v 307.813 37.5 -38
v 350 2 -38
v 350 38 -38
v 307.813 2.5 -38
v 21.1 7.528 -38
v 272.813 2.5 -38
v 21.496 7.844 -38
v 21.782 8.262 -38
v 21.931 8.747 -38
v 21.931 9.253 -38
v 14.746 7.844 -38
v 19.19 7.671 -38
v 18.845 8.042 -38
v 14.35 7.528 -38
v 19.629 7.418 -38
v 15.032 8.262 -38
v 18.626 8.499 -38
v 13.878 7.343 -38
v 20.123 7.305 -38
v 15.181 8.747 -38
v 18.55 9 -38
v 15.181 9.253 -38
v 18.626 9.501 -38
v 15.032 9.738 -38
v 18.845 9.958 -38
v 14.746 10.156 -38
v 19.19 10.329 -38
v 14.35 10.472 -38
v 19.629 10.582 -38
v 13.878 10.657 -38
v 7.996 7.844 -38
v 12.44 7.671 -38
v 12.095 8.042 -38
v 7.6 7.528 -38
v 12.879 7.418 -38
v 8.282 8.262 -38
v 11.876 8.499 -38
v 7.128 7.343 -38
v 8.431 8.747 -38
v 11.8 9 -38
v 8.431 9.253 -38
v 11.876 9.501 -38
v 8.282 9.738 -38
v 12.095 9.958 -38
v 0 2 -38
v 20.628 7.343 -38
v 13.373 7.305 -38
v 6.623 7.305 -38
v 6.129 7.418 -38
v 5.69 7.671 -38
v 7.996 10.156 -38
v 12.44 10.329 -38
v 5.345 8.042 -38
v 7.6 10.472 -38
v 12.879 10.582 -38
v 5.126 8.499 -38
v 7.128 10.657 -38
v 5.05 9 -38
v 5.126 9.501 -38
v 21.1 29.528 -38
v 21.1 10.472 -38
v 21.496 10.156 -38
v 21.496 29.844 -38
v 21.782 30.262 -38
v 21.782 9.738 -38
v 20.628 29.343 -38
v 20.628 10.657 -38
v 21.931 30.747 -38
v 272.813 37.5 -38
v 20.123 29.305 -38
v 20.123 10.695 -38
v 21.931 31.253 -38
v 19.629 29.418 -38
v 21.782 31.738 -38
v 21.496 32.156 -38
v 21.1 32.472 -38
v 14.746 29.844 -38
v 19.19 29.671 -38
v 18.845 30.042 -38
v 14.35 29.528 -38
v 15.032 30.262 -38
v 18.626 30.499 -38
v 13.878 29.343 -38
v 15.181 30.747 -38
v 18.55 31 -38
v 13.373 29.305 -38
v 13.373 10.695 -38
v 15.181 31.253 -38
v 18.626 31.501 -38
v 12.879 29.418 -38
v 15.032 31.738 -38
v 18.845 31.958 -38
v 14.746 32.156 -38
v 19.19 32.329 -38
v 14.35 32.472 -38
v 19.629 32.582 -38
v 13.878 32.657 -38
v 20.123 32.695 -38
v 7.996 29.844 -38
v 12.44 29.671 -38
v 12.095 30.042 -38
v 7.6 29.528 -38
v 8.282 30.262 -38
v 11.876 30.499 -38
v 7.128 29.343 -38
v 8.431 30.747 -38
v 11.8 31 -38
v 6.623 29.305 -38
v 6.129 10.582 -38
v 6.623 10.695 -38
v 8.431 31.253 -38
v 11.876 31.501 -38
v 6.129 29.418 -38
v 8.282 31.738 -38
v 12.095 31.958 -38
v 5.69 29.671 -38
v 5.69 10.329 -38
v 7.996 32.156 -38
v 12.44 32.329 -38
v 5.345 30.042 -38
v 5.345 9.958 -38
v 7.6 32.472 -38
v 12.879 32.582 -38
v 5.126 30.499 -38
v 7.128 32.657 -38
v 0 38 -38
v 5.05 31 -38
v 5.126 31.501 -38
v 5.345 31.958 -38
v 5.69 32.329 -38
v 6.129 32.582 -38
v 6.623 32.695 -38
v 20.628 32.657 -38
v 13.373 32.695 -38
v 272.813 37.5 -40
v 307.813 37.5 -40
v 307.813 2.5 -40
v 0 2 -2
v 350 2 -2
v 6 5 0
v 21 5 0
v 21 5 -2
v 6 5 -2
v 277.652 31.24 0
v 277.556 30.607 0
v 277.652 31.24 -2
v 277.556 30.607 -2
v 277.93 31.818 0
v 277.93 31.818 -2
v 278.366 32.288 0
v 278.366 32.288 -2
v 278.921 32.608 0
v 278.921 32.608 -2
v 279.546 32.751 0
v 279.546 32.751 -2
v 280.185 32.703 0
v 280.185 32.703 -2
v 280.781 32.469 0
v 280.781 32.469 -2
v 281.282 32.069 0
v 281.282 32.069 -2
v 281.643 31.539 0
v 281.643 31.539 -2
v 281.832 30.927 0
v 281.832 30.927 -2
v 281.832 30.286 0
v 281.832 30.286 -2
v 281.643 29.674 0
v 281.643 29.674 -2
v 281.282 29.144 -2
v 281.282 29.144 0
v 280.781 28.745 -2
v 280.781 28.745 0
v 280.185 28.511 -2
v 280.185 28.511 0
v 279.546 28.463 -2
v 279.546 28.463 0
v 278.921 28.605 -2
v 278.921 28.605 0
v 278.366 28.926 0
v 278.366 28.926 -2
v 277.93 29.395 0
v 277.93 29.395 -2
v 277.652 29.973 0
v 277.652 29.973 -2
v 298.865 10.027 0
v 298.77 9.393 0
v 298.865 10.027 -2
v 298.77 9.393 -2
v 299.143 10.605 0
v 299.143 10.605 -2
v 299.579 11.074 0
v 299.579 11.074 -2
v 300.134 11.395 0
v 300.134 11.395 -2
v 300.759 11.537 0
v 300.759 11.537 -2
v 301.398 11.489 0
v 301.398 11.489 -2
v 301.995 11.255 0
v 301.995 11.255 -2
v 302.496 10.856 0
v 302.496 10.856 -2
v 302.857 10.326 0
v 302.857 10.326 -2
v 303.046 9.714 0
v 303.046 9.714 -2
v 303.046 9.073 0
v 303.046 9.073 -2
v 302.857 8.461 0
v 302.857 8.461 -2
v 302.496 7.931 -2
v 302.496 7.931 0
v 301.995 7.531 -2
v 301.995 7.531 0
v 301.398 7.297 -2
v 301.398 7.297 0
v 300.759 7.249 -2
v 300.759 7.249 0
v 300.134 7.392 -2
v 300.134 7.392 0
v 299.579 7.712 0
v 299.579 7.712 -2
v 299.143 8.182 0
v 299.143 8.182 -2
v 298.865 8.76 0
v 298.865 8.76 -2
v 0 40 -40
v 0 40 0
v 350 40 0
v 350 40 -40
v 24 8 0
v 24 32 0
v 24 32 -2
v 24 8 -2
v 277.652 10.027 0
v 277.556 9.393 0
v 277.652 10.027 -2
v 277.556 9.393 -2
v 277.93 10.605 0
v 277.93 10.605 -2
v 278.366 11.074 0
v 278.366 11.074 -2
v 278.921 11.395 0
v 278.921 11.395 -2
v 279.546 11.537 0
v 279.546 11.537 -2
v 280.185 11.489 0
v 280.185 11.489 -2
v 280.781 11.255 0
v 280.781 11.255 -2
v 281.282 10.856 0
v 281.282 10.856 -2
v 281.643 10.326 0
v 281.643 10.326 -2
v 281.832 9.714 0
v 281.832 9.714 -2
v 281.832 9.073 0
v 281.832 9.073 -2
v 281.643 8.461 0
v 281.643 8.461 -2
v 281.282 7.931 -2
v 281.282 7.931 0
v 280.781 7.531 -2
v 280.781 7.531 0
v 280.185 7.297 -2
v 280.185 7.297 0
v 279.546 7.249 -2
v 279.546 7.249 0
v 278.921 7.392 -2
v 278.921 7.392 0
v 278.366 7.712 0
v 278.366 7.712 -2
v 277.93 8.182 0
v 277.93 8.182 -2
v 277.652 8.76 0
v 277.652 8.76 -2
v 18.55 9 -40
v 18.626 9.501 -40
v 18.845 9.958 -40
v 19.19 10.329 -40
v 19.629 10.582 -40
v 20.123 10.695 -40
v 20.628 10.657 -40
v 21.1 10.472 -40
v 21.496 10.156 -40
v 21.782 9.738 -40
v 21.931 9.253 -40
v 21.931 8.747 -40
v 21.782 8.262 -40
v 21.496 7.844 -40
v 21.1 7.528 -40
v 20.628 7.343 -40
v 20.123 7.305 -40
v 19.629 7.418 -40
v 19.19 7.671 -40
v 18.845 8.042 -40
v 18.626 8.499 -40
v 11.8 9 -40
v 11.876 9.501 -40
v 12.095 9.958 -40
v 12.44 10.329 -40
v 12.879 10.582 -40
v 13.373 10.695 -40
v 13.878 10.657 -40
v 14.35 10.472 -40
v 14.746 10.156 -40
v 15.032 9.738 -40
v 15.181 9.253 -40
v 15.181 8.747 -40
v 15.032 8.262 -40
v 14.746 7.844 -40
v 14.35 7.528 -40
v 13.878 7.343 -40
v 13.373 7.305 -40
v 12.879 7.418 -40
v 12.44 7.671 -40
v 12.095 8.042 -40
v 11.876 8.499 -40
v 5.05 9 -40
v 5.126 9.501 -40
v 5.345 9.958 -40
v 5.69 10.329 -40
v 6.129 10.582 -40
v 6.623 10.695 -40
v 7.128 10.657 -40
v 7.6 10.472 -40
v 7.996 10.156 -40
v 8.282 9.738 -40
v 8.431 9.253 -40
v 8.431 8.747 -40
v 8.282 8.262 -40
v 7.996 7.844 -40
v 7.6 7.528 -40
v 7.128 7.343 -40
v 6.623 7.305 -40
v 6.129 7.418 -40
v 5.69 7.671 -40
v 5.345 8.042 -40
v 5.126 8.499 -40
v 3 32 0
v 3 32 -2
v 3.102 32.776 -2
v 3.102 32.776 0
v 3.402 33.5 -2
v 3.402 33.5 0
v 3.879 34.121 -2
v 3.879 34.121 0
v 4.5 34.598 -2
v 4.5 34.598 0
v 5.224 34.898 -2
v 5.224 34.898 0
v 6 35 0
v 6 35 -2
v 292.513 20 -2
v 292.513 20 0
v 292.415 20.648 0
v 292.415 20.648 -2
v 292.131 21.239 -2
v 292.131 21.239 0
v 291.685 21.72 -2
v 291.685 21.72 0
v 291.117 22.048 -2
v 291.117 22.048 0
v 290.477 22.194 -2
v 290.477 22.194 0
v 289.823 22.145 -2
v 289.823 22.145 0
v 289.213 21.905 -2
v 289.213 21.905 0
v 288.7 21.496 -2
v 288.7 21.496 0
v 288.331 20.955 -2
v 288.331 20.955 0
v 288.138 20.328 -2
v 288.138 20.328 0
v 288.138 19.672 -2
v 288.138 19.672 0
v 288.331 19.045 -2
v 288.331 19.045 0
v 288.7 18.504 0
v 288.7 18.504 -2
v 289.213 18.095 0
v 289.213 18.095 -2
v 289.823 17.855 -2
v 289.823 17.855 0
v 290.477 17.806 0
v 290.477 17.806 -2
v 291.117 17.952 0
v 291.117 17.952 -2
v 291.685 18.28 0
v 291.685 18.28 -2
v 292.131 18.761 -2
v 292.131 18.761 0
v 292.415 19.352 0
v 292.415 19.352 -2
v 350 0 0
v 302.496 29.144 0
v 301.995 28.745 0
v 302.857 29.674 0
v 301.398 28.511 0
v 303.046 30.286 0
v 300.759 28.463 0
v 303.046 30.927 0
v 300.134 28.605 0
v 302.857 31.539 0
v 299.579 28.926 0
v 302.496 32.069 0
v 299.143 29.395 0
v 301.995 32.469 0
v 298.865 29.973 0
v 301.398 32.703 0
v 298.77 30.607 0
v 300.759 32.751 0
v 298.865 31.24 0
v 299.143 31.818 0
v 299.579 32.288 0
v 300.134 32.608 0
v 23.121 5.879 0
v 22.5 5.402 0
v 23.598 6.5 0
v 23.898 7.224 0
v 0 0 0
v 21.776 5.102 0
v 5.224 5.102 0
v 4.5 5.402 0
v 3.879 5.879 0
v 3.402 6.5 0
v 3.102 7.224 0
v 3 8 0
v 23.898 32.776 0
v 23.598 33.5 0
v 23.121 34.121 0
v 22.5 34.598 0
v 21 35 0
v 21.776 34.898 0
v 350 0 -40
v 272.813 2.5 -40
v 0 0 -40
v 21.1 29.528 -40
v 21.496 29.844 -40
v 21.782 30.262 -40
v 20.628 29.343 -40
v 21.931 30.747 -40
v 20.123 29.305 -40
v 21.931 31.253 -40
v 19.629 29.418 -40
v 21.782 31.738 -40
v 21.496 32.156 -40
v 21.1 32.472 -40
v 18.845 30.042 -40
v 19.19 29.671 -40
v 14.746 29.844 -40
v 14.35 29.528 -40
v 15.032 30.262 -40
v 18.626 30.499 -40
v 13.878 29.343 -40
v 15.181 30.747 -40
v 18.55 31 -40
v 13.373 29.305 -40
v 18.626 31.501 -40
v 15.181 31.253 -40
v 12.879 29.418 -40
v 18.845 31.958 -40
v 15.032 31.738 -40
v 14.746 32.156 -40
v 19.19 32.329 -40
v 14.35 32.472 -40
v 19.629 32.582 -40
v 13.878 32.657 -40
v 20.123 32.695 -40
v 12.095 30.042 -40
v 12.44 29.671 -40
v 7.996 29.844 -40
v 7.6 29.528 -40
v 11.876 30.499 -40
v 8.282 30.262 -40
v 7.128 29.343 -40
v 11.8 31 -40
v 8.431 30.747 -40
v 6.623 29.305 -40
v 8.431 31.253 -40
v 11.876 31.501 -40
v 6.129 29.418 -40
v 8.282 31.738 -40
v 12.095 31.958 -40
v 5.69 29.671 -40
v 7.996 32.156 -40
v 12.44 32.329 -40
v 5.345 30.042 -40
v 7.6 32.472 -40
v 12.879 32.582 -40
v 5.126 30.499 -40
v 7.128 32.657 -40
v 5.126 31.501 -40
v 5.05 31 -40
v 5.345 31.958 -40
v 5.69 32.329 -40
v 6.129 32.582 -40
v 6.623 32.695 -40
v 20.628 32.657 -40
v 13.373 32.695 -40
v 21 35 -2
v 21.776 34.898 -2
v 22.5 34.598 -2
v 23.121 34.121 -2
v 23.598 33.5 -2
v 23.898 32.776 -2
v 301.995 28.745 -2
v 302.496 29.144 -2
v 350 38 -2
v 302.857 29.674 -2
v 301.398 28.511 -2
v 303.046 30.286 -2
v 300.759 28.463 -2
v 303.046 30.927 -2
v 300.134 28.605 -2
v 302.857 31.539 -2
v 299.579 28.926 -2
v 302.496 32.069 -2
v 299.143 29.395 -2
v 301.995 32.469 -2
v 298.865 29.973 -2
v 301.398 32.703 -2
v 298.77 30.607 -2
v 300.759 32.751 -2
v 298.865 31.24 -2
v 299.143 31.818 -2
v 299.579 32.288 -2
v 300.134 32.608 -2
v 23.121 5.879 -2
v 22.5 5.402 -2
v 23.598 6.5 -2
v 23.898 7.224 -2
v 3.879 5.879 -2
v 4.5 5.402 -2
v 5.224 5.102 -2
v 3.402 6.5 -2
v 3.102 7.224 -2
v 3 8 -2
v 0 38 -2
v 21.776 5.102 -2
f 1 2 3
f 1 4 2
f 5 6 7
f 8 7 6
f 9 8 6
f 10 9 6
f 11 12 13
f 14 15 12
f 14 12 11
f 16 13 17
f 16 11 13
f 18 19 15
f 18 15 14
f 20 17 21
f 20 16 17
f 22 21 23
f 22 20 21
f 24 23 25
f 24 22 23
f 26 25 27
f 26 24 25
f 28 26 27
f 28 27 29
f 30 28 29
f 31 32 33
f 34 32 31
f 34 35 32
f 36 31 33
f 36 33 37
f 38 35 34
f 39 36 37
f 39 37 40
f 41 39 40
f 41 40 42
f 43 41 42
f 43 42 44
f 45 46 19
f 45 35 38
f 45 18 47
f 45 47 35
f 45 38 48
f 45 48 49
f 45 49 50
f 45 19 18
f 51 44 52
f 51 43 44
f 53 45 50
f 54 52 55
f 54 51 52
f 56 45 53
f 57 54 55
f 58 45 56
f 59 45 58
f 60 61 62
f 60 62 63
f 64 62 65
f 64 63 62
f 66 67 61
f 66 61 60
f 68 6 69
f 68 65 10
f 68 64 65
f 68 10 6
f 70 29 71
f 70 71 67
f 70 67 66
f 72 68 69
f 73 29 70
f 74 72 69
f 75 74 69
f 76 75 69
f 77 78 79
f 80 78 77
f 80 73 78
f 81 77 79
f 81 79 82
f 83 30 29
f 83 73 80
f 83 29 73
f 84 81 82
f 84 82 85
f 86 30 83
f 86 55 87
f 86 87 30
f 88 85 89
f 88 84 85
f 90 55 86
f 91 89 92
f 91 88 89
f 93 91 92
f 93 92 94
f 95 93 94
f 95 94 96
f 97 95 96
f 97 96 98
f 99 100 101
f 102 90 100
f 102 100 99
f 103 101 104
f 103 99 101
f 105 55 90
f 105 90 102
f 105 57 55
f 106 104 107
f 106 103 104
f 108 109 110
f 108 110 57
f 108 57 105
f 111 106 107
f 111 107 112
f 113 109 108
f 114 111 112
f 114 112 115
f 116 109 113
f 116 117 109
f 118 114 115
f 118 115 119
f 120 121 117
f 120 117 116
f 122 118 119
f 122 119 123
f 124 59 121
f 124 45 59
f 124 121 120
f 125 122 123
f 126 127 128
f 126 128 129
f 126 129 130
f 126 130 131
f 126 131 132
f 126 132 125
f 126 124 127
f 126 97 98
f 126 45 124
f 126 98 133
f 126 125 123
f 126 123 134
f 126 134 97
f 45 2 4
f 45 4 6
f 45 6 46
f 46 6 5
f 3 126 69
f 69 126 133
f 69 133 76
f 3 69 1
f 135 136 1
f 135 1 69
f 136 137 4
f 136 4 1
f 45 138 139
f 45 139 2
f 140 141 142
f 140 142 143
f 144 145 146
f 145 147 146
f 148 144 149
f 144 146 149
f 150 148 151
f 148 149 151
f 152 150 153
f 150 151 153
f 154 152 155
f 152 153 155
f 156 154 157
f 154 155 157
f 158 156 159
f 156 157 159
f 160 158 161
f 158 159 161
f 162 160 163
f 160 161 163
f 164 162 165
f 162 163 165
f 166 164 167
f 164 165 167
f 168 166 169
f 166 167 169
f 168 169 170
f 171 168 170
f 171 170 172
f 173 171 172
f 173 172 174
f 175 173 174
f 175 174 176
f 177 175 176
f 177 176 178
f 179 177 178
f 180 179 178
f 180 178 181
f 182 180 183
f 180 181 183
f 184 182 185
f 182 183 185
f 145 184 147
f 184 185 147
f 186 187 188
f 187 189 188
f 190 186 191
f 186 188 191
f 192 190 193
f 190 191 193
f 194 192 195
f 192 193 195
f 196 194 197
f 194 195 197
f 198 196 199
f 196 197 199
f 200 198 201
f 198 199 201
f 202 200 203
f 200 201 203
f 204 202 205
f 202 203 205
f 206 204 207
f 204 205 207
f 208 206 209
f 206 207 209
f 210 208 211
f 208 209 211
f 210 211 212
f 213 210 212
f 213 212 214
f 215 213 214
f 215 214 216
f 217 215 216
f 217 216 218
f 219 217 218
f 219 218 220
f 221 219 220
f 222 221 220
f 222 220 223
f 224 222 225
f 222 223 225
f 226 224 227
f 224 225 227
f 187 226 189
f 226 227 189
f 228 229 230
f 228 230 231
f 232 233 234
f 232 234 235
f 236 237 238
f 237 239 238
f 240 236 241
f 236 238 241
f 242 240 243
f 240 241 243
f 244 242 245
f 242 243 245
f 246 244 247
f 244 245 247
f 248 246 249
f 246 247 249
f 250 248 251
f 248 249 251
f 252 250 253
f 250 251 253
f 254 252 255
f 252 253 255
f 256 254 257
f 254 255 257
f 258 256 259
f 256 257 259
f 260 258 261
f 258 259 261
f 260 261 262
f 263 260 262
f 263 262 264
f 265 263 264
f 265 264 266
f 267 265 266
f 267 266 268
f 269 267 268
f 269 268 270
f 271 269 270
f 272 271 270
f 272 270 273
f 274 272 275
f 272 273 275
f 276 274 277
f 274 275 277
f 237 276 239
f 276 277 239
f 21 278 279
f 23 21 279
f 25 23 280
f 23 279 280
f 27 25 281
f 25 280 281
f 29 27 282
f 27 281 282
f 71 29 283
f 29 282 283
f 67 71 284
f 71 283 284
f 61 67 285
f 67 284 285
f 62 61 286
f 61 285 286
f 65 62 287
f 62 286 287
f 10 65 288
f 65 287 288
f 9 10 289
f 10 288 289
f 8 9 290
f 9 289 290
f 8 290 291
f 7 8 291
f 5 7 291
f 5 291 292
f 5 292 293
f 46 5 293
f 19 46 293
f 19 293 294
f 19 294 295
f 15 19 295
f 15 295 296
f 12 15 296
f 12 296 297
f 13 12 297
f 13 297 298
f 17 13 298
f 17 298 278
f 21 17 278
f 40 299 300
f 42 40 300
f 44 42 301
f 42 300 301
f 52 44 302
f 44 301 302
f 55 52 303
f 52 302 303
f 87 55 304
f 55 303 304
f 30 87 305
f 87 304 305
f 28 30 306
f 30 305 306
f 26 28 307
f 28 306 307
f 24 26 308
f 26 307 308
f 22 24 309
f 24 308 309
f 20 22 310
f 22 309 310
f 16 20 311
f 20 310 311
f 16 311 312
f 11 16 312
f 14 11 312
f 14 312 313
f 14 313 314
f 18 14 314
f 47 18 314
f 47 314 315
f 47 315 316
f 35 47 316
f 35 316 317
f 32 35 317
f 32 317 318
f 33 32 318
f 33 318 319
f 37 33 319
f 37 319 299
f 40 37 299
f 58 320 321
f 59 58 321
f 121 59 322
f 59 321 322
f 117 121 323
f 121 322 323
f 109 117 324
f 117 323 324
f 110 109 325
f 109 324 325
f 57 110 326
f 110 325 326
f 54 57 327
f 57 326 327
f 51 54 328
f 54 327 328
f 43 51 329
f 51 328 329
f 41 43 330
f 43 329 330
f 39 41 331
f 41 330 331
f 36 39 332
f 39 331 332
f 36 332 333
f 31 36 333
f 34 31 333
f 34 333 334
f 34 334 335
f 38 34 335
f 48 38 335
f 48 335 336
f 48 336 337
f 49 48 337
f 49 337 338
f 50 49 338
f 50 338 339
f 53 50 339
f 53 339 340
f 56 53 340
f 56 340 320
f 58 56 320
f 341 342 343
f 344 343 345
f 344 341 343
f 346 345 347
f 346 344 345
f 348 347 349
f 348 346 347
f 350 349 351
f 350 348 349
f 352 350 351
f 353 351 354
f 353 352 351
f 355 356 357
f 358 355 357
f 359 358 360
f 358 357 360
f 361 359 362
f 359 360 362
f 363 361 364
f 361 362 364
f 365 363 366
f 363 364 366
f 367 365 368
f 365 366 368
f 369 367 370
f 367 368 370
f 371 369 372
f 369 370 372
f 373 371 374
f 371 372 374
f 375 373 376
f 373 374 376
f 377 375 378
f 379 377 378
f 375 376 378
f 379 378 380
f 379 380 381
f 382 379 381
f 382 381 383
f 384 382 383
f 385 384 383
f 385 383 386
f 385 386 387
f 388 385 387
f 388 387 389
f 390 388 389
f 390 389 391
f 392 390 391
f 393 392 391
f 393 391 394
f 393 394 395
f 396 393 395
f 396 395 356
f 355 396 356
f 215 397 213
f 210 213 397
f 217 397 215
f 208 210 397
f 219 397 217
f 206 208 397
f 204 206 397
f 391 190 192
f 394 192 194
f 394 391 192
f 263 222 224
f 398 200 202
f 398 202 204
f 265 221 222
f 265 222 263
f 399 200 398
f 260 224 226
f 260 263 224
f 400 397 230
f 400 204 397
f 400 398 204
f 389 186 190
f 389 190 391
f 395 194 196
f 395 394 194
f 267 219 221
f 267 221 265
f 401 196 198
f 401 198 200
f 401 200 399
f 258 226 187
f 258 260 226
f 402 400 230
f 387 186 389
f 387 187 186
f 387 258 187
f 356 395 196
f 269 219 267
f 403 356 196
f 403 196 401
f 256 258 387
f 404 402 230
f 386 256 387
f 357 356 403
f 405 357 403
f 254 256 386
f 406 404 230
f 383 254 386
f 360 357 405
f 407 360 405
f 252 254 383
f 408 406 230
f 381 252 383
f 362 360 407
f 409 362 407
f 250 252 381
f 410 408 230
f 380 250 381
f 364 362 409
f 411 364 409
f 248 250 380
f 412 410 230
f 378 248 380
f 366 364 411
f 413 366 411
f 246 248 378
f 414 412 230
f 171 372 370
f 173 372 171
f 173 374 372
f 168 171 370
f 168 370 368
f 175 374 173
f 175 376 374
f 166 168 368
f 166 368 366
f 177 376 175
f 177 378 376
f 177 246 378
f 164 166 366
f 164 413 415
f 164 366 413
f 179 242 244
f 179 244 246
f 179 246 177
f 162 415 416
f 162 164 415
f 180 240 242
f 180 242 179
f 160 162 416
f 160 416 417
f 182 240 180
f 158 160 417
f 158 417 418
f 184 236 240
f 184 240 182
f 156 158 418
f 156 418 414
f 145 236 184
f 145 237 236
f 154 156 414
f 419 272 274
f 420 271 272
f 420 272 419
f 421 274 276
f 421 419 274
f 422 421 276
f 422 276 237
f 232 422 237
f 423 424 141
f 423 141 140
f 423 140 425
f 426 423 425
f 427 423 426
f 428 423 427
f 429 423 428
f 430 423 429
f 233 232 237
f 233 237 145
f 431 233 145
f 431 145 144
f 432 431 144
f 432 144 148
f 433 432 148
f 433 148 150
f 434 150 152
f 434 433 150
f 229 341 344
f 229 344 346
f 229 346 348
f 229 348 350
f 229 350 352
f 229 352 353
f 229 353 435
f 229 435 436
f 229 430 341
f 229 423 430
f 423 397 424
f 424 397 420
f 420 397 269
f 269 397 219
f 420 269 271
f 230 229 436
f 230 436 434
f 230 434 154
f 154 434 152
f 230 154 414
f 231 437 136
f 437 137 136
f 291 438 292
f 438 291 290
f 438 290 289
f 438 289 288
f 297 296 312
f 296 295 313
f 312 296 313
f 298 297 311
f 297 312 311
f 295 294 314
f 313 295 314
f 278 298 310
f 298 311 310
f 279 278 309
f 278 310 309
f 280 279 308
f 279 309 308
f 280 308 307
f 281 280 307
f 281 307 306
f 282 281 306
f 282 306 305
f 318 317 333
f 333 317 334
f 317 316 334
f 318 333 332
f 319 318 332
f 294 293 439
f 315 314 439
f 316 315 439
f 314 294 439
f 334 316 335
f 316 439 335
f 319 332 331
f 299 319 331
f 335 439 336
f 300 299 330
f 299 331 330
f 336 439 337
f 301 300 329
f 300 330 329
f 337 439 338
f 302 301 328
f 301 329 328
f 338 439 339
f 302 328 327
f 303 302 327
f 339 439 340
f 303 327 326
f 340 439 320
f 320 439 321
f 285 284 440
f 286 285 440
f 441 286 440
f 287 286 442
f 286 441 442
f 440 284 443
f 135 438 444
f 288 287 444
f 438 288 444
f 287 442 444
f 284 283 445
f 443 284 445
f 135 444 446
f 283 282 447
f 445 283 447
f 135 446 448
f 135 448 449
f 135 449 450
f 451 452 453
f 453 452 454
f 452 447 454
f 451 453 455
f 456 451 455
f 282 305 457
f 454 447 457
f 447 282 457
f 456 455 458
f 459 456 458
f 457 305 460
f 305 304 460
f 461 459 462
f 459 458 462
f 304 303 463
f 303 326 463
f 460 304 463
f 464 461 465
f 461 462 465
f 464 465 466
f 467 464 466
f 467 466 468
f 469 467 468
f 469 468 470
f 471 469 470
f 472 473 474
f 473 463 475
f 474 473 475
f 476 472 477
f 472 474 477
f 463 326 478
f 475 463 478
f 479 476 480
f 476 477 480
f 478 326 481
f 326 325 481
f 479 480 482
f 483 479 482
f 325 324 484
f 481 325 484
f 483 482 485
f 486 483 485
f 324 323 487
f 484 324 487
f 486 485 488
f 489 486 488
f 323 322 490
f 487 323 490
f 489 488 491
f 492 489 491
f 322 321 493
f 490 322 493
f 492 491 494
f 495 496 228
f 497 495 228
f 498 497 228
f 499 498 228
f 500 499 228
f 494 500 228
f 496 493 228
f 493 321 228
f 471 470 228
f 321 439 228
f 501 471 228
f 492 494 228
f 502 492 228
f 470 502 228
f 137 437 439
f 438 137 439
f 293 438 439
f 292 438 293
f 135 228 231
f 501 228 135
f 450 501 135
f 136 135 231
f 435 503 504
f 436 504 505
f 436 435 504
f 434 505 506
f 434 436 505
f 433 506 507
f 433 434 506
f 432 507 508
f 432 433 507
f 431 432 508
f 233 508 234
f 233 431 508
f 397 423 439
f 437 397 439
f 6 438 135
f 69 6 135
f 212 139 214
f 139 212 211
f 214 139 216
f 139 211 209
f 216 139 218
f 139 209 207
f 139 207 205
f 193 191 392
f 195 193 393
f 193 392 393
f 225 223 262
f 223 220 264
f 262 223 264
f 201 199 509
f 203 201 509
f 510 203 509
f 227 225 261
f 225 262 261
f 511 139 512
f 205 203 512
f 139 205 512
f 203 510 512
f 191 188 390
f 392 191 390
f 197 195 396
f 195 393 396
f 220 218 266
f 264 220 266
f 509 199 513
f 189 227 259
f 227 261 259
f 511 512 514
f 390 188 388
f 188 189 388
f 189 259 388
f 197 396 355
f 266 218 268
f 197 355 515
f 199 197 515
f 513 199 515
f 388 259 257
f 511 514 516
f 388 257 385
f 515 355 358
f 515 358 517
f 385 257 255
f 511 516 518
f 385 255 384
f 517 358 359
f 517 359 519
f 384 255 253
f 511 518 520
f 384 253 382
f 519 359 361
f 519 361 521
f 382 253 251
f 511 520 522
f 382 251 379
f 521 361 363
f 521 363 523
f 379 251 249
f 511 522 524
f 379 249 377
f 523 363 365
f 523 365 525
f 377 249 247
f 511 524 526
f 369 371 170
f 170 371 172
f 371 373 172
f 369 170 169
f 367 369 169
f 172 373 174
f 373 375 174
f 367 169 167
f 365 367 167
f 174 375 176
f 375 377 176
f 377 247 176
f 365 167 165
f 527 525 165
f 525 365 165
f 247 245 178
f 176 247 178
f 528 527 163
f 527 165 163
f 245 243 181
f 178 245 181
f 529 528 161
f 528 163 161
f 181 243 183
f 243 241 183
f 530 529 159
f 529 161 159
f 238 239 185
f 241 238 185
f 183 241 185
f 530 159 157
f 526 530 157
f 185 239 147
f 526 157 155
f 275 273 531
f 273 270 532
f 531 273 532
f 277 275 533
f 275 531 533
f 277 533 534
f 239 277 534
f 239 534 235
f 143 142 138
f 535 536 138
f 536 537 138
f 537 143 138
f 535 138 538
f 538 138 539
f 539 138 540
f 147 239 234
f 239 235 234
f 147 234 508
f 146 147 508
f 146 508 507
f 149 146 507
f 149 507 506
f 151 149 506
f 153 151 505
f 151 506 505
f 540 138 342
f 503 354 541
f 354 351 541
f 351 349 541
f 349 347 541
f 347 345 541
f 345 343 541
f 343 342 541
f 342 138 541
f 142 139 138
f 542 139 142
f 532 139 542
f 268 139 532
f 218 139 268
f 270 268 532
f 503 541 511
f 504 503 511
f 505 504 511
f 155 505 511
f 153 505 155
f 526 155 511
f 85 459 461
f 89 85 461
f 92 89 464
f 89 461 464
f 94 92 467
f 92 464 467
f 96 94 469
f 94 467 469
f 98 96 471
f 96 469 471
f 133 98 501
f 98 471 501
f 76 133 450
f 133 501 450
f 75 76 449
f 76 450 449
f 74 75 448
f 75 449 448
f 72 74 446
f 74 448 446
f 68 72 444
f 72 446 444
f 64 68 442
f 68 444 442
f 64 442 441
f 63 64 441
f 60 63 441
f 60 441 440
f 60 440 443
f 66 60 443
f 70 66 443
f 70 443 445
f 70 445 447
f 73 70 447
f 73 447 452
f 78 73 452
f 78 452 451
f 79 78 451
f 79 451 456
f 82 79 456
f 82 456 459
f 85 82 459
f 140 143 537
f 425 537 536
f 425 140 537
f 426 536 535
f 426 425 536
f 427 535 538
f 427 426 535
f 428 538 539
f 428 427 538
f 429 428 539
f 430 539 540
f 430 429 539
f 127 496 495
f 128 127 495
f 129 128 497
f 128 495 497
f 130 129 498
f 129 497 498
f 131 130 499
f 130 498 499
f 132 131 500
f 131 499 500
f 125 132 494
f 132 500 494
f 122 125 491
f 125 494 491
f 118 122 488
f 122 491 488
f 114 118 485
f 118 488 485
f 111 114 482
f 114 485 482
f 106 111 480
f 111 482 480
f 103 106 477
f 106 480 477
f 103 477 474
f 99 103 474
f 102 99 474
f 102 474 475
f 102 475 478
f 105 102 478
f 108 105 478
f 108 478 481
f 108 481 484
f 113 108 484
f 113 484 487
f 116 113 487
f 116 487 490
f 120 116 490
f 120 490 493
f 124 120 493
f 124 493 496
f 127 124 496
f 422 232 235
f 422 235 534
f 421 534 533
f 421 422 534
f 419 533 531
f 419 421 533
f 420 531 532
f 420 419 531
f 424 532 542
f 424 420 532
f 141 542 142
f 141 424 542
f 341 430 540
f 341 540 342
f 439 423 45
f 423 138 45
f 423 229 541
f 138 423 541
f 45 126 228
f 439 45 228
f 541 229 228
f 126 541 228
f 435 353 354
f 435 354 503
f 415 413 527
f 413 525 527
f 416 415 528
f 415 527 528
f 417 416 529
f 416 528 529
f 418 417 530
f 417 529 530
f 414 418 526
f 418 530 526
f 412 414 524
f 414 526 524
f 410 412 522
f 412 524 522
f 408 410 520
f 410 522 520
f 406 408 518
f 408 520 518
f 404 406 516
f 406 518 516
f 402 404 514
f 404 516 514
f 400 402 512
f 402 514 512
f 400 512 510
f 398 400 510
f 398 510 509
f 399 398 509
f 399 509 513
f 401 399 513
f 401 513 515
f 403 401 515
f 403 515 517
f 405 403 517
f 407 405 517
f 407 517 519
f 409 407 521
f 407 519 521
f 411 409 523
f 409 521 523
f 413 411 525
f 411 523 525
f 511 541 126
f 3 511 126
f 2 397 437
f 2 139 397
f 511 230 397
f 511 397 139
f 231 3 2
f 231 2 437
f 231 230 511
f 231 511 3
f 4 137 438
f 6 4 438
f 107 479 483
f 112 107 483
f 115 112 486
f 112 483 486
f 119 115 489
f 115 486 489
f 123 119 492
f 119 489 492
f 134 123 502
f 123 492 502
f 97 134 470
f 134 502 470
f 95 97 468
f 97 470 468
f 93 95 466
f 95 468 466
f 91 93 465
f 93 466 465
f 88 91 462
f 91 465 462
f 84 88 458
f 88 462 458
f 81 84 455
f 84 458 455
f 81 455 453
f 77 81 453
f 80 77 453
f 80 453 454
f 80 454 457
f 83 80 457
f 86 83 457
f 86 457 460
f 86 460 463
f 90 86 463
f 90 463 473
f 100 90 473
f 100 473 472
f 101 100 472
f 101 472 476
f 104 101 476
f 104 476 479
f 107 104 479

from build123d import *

# Parameters (mm, degrees)
SKETCH1_W                      = 40
SKETCH1_H                      = 40
SKETCH1_W_2                    = 36
SKETCH1_H_2                    = 36
BOSS_EXTRUDE1_DEPTH            = 350
M4_CLEARANCE_HOLE1_D           = 4.3
M4_CLEARANCE_HOLE1_DEPTH       = 2
M4_CLEARANCE_HOLE1_TIP         = 1.291850331
SKETCH5_W                      = 35
SKETCH5_H                      = 35
CUT_EXTRUDE1_DEPTH             = 2
F_4_4_4_4_DIAMETER_HOLE1_D     = 4.4
M3_CLEARANCE_HOLE1_D           = 3.4
M3_CLEARANCE_HOLE1_DEPTH       = 20
M3_CLEARANCE_HOLE1_TIP         = 1.021463052
CUT_EXTRUDE2_REACH             = 356.542
CUT_EXTRUDE2_DIRECTION_2_DEPTH = 355.541958025


with BuildPart() as part:
    # Sketch1 → Boss-Extrude1 (new body)
    with BuildSketch(Plane(origin=(0, 0, 0), x_dir=(0, 0, -1), z_dir=(1, 0, 0))):
        with Locations((20, 20)):
            Rectangle(SKETCH1_W, SKETCH1_H)
        with Locations((20, 20)):
            Rectangle(SKETCH1_W_2, SKETCH1_H_2, mode=Mode.SUBTRACT)
    extrude(amount=BOSS_EXTRUDE1_DEPTH)

    # M4 Clearance Hole1
    with Locations(Plane.XY):
        with Locations((279.706395966, 30.606601718), (300.919599401, 30.606601718), (300.919599401, 9.393398282), (279.706395966, 9.393398282)):
            Hole(M4_CLEARANCE_HOLE1_D / 2, depth=M4_CLEARANCE_HOLE1_DEPTH)
            with Locations((0, 0, -(M4_CLEARANCE_HOLE1_DEPTH + M4_CLEARANCE_HOLE1_TIP / 2))):  # 118° drill point
                Cone(0, M4_CLEARANCE_HOLE1_D / 2, M4_CLEARANCE_HOLE1_TIP, mode=Mode.SUBTRACT)

    # Sketch5 → Cut-Extrude1 (cut)
    with BuildSketch(Plane(origin=(0, 0, -40), x_dir=(-1, 0, 0), z_dir=(0, 0, -1))):
        with Locations((-290.312997684, 20)):
            Rectangle(SKETCH5_W, SKETCH5_H)
    extrude(amount=-CUT_EXTRUDE1_DEPTH, mode=Mode.SUBTRACT)

    # Ø4.4 (4.4) Diameter Hole1 (through all)
    with Locations(Plane(origin=(0, 0, -2), x_dir=(-1, 0, 0), z_dir=(0, 0, -1))):
        with Locations((-290.312997684, 20)):
            Hole(F_4_4_4_4_DIAMETER_HOLE1_D / 2)

    # M3 Clearance Hole1
    with Locations(Plane.XY.offset(-38)):
        with Locations((6.75, 9), (20.25, 31), (13.5, 31), (6.75, 31), (20.25, 9), (13.5, 9)):
            Hole(M3_CLEARANCE_HOLE1_D / 2, depth=M3_CLEARANCE_HOLE1_DEPTH)
            with Locations((0, 0, -(M3_CLEARANCE_HOLE1_DEPTH + M3_CLEARANCE_HOLE1_TIP / 2))):  # 118° drill point
                Cone(0, M3_CLEARANCE_HOLE1_D / 2, M3_CLEARANCE_HOLE1_TIP, mode=Mode.SUBTRACT)

    # Sketch11 → Cut-Extrude2 (cut, up to next)
    with BuildSketch(Plane.XY, mode=Mode.PRIVATE) as cut_extrude2_sk1:
        with BuildLine():
            Line((6, 35), (21, 35))
            ThreePointArc((21, 35), (23.121320344, 34.121320344), (24, 32))
            Line((24, 32), (24, 8))
            ThreePointArc((24, 8), (23.121320344, 5.878679656), (21, 5))
            Line((21, 5), (6, 5))
            ThreePointArc((6, 5), (3.878679656, 5.878679656), (3, 8))
            Line((3, 8), (3, 32))
            ThreePointArc((3, 32), (3.878679656, 34.121320344), (6, 35))
        make_face()
    cut_extrude2_tool1 = extrude(cut_extrude2_sk1.sketch, amount=-CUT_EXTRUDE2_REACH, mode=Mode.PRIVATE) & part.part
    add(cut_extrude2_tool1.solids().sort_by_distance((13.5, 20, 0))[0], mode=Mode.SUBTRACT)

    # Sketch11 → Cut-Extrude2 direction 2 (cut)
    with BuildSketch(Plane.XY):
        with BuildLine():
            Line((6, 35), (21, 35))
            ThreePointArc((21, 35), (23.121320344, 34.121320344), (24, 32))
            Line((24, 32), (24, 8))
            ThreePointArc((24, 8), (23.121320344, 5.878679656), (21, 5))
            Line((21, 5), (6, 5))
            ThreePointArc((6, 5), (3.878679656, 5.878679656), (3, 8))
            Line((3, 8), (3, 32))
            ThreePointArc((3, 32), (3.878679656, 34.121320344), (6, 35))
        make_face()
    extrude(amount=CUT_EXTRUDE2_DIRECTION_2_DEPTH, mode=Mode.SUBTRACT)


solid = part.part
